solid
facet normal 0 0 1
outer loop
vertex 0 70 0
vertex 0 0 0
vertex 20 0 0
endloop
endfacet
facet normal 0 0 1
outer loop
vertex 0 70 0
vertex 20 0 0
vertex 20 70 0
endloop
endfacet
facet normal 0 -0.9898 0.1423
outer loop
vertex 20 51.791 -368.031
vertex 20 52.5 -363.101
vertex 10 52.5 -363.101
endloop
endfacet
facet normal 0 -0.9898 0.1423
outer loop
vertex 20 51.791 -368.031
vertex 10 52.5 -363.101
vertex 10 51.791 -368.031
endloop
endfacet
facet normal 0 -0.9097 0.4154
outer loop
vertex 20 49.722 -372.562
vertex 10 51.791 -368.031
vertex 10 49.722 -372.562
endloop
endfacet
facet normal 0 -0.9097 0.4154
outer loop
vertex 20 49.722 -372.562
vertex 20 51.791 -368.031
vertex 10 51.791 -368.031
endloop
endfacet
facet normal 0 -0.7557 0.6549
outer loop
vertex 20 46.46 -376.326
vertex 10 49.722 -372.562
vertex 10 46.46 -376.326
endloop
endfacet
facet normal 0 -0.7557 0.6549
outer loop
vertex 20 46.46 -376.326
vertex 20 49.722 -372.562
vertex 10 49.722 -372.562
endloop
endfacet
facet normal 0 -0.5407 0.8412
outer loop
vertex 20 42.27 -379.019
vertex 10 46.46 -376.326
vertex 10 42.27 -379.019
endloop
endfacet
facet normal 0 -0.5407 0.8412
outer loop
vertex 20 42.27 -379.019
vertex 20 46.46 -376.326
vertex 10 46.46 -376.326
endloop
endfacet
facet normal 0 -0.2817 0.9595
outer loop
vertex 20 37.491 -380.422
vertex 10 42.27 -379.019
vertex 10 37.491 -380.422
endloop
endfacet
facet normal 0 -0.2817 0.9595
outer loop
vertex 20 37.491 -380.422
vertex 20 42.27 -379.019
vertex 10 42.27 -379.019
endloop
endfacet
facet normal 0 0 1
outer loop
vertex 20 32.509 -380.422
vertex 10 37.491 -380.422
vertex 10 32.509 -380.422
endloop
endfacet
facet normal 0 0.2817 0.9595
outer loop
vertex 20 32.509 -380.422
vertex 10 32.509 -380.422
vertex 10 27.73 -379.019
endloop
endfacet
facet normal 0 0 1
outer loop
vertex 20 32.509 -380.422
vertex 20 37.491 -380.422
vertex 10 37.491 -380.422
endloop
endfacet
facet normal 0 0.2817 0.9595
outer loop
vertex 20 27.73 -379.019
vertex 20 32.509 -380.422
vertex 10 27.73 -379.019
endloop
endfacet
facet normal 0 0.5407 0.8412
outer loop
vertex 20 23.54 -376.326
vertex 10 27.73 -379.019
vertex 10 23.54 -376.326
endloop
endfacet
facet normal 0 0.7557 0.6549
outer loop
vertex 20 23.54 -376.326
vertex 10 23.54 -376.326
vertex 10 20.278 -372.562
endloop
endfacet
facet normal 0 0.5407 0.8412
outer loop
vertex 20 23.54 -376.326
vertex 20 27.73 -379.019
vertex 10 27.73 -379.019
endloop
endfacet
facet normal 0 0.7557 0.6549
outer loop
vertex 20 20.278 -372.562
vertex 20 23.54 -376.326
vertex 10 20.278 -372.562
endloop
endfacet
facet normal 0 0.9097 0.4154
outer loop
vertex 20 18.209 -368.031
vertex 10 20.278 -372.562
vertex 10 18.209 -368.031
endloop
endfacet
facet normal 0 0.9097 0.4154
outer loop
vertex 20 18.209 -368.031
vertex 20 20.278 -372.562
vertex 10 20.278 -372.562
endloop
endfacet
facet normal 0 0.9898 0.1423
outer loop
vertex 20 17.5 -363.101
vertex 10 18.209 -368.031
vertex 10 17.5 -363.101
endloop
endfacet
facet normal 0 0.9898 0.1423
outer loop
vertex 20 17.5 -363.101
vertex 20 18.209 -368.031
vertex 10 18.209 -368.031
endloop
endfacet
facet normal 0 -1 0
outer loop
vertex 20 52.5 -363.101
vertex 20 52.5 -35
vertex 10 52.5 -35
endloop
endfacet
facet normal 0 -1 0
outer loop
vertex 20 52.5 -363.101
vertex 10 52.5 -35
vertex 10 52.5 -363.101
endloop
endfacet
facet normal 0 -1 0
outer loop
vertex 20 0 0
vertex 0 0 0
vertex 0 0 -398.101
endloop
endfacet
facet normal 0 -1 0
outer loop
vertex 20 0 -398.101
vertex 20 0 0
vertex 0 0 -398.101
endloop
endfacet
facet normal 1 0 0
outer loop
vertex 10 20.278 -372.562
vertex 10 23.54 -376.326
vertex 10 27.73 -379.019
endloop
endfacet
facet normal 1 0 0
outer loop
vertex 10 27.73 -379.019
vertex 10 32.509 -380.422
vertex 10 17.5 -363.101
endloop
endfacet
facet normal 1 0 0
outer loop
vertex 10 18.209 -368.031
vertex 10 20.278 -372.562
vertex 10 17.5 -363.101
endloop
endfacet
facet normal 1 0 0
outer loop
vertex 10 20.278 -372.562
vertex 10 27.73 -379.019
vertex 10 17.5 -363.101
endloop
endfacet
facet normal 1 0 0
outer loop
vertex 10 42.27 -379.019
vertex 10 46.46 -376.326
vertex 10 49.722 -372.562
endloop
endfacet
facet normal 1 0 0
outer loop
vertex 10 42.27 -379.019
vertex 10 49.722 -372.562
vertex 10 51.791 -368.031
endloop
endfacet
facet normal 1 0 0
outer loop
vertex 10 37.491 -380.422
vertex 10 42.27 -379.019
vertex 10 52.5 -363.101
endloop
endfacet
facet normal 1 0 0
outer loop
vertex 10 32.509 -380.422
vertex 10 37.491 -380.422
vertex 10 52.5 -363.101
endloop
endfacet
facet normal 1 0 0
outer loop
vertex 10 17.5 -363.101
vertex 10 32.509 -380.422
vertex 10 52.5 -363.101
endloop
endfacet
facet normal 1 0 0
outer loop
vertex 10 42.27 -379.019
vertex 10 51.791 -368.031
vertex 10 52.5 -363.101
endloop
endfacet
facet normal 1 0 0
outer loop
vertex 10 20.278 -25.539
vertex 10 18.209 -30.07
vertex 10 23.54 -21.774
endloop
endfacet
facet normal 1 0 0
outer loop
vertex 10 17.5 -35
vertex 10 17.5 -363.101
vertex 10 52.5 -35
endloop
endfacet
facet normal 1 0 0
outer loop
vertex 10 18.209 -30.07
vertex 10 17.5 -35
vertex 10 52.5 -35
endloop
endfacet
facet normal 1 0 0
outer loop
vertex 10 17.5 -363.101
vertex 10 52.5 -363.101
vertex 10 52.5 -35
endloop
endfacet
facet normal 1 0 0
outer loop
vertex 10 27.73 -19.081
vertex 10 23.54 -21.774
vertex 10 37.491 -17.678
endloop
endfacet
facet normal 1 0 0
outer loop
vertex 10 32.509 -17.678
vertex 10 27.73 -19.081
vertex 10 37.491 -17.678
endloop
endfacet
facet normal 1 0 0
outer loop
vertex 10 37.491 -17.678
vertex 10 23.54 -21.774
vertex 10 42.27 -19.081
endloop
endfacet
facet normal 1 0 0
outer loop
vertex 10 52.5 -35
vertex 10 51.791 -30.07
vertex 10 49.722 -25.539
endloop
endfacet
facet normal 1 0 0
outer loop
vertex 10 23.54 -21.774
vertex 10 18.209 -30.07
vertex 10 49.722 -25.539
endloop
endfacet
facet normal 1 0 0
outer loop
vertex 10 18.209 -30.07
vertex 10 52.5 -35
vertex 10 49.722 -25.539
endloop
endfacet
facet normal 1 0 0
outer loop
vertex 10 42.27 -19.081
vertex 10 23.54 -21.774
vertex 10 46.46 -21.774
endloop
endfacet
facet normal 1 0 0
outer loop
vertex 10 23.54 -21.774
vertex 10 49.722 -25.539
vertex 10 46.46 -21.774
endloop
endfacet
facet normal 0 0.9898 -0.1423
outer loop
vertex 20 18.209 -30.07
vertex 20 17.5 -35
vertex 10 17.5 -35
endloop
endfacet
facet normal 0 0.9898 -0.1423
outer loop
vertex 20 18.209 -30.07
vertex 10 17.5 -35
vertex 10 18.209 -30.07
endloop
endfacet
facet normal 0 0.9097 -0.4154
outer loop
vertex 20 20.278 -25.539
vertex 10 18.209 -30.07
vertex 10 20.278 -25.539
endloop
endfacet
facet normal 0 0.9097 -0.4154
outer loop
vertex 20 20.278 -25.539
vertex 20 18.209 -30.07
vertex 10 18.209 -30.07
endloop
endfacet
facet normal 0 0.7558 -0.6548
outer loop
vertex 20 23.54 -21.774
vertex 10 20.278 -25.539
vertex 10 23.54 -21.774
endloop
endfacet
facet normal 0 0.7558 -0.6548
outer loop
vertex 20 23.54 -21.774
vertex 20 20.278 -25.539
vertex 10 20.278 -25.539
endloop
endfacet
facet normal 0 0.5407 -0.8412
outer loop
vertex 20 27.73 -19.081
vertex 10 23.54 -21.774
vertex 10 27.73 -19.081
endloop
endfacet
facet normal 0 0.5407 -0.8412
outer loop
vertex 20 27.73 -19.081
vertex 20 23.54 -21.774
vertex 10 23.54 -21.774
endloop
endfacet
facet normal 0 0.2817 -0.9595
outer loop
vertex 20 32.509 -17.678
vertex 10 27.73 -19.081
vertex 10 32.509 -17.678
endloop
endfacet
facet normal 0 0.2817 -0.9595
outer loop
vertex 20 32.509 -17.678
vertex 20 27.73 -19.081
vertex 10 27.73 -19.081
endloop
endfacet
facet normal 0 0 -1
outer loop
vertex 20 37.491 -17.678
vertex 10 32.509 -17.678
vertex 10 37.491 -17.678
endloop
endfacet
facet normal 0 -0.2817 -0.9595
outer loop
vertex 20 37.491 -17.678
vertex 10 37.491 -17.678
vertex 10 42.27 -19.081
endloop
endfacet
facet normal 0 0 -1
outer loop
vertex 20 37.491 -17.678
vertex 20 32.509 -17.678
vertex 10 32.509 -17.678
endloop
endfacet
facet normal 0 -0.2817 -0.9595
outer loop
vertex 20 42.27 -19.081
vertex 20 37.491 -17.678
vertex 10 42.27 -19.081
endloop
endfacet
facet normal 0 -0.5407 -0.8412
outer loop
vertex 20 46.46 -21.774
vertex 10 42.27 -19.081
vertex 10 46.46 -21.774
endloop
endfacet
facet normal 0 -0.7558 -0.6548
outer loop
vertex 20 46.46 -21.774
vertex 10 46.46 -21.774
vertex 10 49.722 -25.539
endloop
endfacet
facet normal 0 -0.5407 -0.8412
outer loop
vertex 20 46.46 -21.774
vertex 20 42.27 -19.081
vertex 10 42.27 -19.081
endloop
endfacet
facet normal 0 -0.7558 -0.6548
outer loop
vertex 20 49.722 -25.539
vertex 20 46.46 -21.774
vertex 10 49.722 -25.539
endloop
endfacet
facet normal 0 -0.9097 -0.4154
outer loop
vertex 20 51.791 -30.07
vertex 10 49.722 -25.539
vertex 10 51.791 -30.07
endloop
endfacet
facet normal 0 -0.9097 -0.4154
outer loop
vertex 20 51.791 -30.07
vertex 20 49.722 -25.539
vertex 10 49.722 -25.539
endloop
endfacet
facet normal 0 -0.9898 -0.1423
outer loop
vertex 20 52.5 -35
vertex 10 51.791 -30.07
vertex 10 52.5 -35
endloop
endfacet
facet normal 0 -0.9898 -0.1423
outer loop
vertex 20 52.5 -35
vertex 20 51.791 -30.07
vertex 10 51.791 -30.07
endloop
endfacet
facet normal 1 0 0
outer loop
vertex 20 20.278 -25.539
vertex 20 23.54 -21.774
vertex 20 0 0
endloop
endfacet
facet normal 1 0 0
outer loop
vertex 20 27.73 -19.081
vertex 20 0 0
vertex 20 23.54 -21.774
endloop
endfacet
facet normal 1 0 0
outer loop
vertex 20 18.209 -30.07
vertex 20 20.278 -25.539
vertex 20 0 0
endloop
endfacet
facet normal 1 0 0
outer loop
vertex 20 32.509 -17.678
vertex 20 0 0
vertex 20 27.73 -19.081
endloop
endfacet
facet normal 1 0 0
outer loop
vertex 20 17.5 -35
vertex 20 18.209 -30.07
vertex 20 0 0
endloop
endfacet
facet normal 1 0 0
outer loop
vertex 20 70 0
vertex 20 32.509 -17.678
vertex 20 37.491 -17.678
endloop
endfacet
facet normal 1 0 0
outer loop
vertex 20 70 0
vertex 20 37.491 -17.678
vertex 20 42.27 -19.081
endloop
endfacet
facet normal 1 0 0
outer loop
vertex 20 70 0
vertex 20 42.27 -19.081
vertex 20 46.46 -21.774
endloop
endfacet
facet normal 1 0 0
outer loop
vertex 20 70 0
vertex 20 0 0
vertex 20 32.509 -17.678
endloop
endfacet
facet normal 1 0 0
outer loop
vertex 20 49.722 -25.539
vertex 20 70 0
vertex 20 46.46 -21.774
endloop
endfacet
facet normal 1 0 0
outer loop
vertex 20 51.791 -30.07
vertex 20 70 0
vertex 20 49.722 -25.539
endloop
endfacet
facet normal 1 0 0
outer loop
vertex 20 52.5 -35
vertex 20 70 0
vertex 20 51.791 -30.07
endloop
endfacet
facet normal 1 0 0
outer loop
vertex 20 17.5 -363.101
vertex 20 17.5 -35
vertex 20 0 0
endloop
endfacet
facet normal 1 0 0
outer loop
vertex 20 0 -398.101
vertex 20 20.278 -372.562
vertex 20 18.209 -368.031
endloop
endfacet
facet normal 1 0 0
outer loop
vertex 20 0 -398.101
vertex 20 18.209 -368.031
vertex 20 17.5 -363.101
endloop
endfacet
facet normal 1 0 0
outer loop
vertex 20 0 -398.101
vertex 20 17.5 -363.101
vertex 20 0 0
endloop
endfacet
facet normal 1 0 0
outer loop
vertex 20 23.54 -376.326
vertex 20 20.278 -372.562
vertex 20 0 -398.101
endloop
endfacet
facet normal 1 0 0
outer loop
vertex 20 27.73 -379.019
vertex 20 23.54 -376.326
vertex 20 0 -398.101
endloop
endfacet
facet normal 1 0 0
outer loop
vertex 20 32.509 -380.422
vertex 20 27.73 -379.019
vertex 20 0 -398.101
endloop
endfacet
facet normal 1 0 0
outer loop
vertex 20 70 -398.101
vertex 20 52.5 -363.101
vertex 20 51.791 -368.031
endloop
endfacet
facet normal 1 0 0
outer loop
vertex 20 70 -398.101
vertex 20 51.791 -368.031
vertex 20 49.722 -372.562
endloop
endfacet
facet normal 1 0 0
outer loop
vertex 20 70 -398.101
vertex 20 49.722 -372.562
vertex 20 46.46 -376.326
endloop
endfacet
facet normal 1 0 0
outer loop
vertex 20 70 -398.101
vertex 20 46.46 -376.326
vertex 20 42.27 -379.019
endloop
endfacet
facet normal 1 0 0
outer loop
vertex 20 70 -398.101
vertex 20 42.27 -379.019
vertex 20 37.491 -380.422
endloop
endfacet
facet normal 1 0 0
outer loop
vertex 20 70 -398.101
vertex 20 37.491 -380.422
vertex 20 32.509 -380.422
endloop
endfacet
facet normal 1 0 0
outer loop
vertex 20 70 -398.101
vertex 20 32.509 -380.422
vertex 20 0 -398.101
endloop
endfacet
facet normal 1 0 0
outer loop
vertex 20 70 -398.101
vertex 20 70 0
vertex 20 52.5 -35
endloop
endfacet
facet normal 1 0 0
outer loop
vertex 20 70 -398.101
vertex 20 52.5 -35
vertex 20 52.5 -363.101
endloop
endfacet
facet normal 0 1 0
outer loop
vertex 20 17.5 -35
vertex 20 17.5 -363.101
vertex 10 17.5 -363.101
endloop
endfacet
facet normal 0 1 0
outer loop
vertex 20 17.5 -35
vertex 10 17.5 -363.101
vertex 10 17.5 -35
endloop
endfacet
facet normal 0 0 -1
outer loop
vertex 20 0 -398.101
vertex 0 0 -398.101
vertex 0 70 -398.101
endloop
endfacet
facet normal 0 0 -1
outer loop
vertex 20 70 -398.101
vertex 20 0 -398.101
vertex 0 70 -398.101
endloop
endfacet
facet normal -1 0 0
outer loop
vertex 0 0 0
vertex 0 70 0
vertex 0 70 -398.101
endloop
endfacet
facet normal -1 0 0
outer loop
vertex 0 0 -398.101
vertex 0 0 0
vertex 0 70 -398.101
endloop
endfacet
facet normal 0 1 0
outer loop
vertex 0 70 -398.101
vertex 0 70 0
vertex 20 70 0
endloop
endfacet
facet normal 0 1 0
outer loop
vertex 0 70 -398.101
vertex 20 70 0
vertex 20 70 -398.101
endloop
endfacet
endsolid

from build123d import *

# Parameters (mm, degrees)
SKETCH2_W           = 398.100558659
SKETCH2_H           = 70
BOSS_EXTRUDE1_DEPTH = 20
CUT_EXTRUDE1_DEPTH  = 10


with BuildPart() as part:
    # Sketch2 → Boss-Extrude1 (new body)
    with BuildSketch(Plane(origin=(0, 0, 0), x_dir=(0, 0, -1), z_dir=(1, 0, 0))):
        with Locations((199.05027933, 35)):
            Rectangle(SKETCH2_W, SKETCH2_H)
    extrude(amount=BOSS_EXTRUDE1_DEPTH)

    # Sketch3 → Cut-Extrude1 (cut)
    with BuildSketch(Plane(origin=(20, 0, 0), x_dir=(0, 0, -1), z_dir=(1, 0, 0))):
        with BuildLine():
            Line((35, 52.5), (363.100558659, 52.5))
            ThreePointArc((363.100558659, 52.5), (380.600558659, 35), (363.100558659, 17.5))
            Line((363.100558659, 17.5), (35, 17.5))
            ThreePointArc((35, 17.5), (17.5, 35), (35, 52.5))
        make_face()
    extrude(amount=-CUT_EXTRUDE1_DEPTH, mode=Mode.SUBTRACT)


solid = part.part
